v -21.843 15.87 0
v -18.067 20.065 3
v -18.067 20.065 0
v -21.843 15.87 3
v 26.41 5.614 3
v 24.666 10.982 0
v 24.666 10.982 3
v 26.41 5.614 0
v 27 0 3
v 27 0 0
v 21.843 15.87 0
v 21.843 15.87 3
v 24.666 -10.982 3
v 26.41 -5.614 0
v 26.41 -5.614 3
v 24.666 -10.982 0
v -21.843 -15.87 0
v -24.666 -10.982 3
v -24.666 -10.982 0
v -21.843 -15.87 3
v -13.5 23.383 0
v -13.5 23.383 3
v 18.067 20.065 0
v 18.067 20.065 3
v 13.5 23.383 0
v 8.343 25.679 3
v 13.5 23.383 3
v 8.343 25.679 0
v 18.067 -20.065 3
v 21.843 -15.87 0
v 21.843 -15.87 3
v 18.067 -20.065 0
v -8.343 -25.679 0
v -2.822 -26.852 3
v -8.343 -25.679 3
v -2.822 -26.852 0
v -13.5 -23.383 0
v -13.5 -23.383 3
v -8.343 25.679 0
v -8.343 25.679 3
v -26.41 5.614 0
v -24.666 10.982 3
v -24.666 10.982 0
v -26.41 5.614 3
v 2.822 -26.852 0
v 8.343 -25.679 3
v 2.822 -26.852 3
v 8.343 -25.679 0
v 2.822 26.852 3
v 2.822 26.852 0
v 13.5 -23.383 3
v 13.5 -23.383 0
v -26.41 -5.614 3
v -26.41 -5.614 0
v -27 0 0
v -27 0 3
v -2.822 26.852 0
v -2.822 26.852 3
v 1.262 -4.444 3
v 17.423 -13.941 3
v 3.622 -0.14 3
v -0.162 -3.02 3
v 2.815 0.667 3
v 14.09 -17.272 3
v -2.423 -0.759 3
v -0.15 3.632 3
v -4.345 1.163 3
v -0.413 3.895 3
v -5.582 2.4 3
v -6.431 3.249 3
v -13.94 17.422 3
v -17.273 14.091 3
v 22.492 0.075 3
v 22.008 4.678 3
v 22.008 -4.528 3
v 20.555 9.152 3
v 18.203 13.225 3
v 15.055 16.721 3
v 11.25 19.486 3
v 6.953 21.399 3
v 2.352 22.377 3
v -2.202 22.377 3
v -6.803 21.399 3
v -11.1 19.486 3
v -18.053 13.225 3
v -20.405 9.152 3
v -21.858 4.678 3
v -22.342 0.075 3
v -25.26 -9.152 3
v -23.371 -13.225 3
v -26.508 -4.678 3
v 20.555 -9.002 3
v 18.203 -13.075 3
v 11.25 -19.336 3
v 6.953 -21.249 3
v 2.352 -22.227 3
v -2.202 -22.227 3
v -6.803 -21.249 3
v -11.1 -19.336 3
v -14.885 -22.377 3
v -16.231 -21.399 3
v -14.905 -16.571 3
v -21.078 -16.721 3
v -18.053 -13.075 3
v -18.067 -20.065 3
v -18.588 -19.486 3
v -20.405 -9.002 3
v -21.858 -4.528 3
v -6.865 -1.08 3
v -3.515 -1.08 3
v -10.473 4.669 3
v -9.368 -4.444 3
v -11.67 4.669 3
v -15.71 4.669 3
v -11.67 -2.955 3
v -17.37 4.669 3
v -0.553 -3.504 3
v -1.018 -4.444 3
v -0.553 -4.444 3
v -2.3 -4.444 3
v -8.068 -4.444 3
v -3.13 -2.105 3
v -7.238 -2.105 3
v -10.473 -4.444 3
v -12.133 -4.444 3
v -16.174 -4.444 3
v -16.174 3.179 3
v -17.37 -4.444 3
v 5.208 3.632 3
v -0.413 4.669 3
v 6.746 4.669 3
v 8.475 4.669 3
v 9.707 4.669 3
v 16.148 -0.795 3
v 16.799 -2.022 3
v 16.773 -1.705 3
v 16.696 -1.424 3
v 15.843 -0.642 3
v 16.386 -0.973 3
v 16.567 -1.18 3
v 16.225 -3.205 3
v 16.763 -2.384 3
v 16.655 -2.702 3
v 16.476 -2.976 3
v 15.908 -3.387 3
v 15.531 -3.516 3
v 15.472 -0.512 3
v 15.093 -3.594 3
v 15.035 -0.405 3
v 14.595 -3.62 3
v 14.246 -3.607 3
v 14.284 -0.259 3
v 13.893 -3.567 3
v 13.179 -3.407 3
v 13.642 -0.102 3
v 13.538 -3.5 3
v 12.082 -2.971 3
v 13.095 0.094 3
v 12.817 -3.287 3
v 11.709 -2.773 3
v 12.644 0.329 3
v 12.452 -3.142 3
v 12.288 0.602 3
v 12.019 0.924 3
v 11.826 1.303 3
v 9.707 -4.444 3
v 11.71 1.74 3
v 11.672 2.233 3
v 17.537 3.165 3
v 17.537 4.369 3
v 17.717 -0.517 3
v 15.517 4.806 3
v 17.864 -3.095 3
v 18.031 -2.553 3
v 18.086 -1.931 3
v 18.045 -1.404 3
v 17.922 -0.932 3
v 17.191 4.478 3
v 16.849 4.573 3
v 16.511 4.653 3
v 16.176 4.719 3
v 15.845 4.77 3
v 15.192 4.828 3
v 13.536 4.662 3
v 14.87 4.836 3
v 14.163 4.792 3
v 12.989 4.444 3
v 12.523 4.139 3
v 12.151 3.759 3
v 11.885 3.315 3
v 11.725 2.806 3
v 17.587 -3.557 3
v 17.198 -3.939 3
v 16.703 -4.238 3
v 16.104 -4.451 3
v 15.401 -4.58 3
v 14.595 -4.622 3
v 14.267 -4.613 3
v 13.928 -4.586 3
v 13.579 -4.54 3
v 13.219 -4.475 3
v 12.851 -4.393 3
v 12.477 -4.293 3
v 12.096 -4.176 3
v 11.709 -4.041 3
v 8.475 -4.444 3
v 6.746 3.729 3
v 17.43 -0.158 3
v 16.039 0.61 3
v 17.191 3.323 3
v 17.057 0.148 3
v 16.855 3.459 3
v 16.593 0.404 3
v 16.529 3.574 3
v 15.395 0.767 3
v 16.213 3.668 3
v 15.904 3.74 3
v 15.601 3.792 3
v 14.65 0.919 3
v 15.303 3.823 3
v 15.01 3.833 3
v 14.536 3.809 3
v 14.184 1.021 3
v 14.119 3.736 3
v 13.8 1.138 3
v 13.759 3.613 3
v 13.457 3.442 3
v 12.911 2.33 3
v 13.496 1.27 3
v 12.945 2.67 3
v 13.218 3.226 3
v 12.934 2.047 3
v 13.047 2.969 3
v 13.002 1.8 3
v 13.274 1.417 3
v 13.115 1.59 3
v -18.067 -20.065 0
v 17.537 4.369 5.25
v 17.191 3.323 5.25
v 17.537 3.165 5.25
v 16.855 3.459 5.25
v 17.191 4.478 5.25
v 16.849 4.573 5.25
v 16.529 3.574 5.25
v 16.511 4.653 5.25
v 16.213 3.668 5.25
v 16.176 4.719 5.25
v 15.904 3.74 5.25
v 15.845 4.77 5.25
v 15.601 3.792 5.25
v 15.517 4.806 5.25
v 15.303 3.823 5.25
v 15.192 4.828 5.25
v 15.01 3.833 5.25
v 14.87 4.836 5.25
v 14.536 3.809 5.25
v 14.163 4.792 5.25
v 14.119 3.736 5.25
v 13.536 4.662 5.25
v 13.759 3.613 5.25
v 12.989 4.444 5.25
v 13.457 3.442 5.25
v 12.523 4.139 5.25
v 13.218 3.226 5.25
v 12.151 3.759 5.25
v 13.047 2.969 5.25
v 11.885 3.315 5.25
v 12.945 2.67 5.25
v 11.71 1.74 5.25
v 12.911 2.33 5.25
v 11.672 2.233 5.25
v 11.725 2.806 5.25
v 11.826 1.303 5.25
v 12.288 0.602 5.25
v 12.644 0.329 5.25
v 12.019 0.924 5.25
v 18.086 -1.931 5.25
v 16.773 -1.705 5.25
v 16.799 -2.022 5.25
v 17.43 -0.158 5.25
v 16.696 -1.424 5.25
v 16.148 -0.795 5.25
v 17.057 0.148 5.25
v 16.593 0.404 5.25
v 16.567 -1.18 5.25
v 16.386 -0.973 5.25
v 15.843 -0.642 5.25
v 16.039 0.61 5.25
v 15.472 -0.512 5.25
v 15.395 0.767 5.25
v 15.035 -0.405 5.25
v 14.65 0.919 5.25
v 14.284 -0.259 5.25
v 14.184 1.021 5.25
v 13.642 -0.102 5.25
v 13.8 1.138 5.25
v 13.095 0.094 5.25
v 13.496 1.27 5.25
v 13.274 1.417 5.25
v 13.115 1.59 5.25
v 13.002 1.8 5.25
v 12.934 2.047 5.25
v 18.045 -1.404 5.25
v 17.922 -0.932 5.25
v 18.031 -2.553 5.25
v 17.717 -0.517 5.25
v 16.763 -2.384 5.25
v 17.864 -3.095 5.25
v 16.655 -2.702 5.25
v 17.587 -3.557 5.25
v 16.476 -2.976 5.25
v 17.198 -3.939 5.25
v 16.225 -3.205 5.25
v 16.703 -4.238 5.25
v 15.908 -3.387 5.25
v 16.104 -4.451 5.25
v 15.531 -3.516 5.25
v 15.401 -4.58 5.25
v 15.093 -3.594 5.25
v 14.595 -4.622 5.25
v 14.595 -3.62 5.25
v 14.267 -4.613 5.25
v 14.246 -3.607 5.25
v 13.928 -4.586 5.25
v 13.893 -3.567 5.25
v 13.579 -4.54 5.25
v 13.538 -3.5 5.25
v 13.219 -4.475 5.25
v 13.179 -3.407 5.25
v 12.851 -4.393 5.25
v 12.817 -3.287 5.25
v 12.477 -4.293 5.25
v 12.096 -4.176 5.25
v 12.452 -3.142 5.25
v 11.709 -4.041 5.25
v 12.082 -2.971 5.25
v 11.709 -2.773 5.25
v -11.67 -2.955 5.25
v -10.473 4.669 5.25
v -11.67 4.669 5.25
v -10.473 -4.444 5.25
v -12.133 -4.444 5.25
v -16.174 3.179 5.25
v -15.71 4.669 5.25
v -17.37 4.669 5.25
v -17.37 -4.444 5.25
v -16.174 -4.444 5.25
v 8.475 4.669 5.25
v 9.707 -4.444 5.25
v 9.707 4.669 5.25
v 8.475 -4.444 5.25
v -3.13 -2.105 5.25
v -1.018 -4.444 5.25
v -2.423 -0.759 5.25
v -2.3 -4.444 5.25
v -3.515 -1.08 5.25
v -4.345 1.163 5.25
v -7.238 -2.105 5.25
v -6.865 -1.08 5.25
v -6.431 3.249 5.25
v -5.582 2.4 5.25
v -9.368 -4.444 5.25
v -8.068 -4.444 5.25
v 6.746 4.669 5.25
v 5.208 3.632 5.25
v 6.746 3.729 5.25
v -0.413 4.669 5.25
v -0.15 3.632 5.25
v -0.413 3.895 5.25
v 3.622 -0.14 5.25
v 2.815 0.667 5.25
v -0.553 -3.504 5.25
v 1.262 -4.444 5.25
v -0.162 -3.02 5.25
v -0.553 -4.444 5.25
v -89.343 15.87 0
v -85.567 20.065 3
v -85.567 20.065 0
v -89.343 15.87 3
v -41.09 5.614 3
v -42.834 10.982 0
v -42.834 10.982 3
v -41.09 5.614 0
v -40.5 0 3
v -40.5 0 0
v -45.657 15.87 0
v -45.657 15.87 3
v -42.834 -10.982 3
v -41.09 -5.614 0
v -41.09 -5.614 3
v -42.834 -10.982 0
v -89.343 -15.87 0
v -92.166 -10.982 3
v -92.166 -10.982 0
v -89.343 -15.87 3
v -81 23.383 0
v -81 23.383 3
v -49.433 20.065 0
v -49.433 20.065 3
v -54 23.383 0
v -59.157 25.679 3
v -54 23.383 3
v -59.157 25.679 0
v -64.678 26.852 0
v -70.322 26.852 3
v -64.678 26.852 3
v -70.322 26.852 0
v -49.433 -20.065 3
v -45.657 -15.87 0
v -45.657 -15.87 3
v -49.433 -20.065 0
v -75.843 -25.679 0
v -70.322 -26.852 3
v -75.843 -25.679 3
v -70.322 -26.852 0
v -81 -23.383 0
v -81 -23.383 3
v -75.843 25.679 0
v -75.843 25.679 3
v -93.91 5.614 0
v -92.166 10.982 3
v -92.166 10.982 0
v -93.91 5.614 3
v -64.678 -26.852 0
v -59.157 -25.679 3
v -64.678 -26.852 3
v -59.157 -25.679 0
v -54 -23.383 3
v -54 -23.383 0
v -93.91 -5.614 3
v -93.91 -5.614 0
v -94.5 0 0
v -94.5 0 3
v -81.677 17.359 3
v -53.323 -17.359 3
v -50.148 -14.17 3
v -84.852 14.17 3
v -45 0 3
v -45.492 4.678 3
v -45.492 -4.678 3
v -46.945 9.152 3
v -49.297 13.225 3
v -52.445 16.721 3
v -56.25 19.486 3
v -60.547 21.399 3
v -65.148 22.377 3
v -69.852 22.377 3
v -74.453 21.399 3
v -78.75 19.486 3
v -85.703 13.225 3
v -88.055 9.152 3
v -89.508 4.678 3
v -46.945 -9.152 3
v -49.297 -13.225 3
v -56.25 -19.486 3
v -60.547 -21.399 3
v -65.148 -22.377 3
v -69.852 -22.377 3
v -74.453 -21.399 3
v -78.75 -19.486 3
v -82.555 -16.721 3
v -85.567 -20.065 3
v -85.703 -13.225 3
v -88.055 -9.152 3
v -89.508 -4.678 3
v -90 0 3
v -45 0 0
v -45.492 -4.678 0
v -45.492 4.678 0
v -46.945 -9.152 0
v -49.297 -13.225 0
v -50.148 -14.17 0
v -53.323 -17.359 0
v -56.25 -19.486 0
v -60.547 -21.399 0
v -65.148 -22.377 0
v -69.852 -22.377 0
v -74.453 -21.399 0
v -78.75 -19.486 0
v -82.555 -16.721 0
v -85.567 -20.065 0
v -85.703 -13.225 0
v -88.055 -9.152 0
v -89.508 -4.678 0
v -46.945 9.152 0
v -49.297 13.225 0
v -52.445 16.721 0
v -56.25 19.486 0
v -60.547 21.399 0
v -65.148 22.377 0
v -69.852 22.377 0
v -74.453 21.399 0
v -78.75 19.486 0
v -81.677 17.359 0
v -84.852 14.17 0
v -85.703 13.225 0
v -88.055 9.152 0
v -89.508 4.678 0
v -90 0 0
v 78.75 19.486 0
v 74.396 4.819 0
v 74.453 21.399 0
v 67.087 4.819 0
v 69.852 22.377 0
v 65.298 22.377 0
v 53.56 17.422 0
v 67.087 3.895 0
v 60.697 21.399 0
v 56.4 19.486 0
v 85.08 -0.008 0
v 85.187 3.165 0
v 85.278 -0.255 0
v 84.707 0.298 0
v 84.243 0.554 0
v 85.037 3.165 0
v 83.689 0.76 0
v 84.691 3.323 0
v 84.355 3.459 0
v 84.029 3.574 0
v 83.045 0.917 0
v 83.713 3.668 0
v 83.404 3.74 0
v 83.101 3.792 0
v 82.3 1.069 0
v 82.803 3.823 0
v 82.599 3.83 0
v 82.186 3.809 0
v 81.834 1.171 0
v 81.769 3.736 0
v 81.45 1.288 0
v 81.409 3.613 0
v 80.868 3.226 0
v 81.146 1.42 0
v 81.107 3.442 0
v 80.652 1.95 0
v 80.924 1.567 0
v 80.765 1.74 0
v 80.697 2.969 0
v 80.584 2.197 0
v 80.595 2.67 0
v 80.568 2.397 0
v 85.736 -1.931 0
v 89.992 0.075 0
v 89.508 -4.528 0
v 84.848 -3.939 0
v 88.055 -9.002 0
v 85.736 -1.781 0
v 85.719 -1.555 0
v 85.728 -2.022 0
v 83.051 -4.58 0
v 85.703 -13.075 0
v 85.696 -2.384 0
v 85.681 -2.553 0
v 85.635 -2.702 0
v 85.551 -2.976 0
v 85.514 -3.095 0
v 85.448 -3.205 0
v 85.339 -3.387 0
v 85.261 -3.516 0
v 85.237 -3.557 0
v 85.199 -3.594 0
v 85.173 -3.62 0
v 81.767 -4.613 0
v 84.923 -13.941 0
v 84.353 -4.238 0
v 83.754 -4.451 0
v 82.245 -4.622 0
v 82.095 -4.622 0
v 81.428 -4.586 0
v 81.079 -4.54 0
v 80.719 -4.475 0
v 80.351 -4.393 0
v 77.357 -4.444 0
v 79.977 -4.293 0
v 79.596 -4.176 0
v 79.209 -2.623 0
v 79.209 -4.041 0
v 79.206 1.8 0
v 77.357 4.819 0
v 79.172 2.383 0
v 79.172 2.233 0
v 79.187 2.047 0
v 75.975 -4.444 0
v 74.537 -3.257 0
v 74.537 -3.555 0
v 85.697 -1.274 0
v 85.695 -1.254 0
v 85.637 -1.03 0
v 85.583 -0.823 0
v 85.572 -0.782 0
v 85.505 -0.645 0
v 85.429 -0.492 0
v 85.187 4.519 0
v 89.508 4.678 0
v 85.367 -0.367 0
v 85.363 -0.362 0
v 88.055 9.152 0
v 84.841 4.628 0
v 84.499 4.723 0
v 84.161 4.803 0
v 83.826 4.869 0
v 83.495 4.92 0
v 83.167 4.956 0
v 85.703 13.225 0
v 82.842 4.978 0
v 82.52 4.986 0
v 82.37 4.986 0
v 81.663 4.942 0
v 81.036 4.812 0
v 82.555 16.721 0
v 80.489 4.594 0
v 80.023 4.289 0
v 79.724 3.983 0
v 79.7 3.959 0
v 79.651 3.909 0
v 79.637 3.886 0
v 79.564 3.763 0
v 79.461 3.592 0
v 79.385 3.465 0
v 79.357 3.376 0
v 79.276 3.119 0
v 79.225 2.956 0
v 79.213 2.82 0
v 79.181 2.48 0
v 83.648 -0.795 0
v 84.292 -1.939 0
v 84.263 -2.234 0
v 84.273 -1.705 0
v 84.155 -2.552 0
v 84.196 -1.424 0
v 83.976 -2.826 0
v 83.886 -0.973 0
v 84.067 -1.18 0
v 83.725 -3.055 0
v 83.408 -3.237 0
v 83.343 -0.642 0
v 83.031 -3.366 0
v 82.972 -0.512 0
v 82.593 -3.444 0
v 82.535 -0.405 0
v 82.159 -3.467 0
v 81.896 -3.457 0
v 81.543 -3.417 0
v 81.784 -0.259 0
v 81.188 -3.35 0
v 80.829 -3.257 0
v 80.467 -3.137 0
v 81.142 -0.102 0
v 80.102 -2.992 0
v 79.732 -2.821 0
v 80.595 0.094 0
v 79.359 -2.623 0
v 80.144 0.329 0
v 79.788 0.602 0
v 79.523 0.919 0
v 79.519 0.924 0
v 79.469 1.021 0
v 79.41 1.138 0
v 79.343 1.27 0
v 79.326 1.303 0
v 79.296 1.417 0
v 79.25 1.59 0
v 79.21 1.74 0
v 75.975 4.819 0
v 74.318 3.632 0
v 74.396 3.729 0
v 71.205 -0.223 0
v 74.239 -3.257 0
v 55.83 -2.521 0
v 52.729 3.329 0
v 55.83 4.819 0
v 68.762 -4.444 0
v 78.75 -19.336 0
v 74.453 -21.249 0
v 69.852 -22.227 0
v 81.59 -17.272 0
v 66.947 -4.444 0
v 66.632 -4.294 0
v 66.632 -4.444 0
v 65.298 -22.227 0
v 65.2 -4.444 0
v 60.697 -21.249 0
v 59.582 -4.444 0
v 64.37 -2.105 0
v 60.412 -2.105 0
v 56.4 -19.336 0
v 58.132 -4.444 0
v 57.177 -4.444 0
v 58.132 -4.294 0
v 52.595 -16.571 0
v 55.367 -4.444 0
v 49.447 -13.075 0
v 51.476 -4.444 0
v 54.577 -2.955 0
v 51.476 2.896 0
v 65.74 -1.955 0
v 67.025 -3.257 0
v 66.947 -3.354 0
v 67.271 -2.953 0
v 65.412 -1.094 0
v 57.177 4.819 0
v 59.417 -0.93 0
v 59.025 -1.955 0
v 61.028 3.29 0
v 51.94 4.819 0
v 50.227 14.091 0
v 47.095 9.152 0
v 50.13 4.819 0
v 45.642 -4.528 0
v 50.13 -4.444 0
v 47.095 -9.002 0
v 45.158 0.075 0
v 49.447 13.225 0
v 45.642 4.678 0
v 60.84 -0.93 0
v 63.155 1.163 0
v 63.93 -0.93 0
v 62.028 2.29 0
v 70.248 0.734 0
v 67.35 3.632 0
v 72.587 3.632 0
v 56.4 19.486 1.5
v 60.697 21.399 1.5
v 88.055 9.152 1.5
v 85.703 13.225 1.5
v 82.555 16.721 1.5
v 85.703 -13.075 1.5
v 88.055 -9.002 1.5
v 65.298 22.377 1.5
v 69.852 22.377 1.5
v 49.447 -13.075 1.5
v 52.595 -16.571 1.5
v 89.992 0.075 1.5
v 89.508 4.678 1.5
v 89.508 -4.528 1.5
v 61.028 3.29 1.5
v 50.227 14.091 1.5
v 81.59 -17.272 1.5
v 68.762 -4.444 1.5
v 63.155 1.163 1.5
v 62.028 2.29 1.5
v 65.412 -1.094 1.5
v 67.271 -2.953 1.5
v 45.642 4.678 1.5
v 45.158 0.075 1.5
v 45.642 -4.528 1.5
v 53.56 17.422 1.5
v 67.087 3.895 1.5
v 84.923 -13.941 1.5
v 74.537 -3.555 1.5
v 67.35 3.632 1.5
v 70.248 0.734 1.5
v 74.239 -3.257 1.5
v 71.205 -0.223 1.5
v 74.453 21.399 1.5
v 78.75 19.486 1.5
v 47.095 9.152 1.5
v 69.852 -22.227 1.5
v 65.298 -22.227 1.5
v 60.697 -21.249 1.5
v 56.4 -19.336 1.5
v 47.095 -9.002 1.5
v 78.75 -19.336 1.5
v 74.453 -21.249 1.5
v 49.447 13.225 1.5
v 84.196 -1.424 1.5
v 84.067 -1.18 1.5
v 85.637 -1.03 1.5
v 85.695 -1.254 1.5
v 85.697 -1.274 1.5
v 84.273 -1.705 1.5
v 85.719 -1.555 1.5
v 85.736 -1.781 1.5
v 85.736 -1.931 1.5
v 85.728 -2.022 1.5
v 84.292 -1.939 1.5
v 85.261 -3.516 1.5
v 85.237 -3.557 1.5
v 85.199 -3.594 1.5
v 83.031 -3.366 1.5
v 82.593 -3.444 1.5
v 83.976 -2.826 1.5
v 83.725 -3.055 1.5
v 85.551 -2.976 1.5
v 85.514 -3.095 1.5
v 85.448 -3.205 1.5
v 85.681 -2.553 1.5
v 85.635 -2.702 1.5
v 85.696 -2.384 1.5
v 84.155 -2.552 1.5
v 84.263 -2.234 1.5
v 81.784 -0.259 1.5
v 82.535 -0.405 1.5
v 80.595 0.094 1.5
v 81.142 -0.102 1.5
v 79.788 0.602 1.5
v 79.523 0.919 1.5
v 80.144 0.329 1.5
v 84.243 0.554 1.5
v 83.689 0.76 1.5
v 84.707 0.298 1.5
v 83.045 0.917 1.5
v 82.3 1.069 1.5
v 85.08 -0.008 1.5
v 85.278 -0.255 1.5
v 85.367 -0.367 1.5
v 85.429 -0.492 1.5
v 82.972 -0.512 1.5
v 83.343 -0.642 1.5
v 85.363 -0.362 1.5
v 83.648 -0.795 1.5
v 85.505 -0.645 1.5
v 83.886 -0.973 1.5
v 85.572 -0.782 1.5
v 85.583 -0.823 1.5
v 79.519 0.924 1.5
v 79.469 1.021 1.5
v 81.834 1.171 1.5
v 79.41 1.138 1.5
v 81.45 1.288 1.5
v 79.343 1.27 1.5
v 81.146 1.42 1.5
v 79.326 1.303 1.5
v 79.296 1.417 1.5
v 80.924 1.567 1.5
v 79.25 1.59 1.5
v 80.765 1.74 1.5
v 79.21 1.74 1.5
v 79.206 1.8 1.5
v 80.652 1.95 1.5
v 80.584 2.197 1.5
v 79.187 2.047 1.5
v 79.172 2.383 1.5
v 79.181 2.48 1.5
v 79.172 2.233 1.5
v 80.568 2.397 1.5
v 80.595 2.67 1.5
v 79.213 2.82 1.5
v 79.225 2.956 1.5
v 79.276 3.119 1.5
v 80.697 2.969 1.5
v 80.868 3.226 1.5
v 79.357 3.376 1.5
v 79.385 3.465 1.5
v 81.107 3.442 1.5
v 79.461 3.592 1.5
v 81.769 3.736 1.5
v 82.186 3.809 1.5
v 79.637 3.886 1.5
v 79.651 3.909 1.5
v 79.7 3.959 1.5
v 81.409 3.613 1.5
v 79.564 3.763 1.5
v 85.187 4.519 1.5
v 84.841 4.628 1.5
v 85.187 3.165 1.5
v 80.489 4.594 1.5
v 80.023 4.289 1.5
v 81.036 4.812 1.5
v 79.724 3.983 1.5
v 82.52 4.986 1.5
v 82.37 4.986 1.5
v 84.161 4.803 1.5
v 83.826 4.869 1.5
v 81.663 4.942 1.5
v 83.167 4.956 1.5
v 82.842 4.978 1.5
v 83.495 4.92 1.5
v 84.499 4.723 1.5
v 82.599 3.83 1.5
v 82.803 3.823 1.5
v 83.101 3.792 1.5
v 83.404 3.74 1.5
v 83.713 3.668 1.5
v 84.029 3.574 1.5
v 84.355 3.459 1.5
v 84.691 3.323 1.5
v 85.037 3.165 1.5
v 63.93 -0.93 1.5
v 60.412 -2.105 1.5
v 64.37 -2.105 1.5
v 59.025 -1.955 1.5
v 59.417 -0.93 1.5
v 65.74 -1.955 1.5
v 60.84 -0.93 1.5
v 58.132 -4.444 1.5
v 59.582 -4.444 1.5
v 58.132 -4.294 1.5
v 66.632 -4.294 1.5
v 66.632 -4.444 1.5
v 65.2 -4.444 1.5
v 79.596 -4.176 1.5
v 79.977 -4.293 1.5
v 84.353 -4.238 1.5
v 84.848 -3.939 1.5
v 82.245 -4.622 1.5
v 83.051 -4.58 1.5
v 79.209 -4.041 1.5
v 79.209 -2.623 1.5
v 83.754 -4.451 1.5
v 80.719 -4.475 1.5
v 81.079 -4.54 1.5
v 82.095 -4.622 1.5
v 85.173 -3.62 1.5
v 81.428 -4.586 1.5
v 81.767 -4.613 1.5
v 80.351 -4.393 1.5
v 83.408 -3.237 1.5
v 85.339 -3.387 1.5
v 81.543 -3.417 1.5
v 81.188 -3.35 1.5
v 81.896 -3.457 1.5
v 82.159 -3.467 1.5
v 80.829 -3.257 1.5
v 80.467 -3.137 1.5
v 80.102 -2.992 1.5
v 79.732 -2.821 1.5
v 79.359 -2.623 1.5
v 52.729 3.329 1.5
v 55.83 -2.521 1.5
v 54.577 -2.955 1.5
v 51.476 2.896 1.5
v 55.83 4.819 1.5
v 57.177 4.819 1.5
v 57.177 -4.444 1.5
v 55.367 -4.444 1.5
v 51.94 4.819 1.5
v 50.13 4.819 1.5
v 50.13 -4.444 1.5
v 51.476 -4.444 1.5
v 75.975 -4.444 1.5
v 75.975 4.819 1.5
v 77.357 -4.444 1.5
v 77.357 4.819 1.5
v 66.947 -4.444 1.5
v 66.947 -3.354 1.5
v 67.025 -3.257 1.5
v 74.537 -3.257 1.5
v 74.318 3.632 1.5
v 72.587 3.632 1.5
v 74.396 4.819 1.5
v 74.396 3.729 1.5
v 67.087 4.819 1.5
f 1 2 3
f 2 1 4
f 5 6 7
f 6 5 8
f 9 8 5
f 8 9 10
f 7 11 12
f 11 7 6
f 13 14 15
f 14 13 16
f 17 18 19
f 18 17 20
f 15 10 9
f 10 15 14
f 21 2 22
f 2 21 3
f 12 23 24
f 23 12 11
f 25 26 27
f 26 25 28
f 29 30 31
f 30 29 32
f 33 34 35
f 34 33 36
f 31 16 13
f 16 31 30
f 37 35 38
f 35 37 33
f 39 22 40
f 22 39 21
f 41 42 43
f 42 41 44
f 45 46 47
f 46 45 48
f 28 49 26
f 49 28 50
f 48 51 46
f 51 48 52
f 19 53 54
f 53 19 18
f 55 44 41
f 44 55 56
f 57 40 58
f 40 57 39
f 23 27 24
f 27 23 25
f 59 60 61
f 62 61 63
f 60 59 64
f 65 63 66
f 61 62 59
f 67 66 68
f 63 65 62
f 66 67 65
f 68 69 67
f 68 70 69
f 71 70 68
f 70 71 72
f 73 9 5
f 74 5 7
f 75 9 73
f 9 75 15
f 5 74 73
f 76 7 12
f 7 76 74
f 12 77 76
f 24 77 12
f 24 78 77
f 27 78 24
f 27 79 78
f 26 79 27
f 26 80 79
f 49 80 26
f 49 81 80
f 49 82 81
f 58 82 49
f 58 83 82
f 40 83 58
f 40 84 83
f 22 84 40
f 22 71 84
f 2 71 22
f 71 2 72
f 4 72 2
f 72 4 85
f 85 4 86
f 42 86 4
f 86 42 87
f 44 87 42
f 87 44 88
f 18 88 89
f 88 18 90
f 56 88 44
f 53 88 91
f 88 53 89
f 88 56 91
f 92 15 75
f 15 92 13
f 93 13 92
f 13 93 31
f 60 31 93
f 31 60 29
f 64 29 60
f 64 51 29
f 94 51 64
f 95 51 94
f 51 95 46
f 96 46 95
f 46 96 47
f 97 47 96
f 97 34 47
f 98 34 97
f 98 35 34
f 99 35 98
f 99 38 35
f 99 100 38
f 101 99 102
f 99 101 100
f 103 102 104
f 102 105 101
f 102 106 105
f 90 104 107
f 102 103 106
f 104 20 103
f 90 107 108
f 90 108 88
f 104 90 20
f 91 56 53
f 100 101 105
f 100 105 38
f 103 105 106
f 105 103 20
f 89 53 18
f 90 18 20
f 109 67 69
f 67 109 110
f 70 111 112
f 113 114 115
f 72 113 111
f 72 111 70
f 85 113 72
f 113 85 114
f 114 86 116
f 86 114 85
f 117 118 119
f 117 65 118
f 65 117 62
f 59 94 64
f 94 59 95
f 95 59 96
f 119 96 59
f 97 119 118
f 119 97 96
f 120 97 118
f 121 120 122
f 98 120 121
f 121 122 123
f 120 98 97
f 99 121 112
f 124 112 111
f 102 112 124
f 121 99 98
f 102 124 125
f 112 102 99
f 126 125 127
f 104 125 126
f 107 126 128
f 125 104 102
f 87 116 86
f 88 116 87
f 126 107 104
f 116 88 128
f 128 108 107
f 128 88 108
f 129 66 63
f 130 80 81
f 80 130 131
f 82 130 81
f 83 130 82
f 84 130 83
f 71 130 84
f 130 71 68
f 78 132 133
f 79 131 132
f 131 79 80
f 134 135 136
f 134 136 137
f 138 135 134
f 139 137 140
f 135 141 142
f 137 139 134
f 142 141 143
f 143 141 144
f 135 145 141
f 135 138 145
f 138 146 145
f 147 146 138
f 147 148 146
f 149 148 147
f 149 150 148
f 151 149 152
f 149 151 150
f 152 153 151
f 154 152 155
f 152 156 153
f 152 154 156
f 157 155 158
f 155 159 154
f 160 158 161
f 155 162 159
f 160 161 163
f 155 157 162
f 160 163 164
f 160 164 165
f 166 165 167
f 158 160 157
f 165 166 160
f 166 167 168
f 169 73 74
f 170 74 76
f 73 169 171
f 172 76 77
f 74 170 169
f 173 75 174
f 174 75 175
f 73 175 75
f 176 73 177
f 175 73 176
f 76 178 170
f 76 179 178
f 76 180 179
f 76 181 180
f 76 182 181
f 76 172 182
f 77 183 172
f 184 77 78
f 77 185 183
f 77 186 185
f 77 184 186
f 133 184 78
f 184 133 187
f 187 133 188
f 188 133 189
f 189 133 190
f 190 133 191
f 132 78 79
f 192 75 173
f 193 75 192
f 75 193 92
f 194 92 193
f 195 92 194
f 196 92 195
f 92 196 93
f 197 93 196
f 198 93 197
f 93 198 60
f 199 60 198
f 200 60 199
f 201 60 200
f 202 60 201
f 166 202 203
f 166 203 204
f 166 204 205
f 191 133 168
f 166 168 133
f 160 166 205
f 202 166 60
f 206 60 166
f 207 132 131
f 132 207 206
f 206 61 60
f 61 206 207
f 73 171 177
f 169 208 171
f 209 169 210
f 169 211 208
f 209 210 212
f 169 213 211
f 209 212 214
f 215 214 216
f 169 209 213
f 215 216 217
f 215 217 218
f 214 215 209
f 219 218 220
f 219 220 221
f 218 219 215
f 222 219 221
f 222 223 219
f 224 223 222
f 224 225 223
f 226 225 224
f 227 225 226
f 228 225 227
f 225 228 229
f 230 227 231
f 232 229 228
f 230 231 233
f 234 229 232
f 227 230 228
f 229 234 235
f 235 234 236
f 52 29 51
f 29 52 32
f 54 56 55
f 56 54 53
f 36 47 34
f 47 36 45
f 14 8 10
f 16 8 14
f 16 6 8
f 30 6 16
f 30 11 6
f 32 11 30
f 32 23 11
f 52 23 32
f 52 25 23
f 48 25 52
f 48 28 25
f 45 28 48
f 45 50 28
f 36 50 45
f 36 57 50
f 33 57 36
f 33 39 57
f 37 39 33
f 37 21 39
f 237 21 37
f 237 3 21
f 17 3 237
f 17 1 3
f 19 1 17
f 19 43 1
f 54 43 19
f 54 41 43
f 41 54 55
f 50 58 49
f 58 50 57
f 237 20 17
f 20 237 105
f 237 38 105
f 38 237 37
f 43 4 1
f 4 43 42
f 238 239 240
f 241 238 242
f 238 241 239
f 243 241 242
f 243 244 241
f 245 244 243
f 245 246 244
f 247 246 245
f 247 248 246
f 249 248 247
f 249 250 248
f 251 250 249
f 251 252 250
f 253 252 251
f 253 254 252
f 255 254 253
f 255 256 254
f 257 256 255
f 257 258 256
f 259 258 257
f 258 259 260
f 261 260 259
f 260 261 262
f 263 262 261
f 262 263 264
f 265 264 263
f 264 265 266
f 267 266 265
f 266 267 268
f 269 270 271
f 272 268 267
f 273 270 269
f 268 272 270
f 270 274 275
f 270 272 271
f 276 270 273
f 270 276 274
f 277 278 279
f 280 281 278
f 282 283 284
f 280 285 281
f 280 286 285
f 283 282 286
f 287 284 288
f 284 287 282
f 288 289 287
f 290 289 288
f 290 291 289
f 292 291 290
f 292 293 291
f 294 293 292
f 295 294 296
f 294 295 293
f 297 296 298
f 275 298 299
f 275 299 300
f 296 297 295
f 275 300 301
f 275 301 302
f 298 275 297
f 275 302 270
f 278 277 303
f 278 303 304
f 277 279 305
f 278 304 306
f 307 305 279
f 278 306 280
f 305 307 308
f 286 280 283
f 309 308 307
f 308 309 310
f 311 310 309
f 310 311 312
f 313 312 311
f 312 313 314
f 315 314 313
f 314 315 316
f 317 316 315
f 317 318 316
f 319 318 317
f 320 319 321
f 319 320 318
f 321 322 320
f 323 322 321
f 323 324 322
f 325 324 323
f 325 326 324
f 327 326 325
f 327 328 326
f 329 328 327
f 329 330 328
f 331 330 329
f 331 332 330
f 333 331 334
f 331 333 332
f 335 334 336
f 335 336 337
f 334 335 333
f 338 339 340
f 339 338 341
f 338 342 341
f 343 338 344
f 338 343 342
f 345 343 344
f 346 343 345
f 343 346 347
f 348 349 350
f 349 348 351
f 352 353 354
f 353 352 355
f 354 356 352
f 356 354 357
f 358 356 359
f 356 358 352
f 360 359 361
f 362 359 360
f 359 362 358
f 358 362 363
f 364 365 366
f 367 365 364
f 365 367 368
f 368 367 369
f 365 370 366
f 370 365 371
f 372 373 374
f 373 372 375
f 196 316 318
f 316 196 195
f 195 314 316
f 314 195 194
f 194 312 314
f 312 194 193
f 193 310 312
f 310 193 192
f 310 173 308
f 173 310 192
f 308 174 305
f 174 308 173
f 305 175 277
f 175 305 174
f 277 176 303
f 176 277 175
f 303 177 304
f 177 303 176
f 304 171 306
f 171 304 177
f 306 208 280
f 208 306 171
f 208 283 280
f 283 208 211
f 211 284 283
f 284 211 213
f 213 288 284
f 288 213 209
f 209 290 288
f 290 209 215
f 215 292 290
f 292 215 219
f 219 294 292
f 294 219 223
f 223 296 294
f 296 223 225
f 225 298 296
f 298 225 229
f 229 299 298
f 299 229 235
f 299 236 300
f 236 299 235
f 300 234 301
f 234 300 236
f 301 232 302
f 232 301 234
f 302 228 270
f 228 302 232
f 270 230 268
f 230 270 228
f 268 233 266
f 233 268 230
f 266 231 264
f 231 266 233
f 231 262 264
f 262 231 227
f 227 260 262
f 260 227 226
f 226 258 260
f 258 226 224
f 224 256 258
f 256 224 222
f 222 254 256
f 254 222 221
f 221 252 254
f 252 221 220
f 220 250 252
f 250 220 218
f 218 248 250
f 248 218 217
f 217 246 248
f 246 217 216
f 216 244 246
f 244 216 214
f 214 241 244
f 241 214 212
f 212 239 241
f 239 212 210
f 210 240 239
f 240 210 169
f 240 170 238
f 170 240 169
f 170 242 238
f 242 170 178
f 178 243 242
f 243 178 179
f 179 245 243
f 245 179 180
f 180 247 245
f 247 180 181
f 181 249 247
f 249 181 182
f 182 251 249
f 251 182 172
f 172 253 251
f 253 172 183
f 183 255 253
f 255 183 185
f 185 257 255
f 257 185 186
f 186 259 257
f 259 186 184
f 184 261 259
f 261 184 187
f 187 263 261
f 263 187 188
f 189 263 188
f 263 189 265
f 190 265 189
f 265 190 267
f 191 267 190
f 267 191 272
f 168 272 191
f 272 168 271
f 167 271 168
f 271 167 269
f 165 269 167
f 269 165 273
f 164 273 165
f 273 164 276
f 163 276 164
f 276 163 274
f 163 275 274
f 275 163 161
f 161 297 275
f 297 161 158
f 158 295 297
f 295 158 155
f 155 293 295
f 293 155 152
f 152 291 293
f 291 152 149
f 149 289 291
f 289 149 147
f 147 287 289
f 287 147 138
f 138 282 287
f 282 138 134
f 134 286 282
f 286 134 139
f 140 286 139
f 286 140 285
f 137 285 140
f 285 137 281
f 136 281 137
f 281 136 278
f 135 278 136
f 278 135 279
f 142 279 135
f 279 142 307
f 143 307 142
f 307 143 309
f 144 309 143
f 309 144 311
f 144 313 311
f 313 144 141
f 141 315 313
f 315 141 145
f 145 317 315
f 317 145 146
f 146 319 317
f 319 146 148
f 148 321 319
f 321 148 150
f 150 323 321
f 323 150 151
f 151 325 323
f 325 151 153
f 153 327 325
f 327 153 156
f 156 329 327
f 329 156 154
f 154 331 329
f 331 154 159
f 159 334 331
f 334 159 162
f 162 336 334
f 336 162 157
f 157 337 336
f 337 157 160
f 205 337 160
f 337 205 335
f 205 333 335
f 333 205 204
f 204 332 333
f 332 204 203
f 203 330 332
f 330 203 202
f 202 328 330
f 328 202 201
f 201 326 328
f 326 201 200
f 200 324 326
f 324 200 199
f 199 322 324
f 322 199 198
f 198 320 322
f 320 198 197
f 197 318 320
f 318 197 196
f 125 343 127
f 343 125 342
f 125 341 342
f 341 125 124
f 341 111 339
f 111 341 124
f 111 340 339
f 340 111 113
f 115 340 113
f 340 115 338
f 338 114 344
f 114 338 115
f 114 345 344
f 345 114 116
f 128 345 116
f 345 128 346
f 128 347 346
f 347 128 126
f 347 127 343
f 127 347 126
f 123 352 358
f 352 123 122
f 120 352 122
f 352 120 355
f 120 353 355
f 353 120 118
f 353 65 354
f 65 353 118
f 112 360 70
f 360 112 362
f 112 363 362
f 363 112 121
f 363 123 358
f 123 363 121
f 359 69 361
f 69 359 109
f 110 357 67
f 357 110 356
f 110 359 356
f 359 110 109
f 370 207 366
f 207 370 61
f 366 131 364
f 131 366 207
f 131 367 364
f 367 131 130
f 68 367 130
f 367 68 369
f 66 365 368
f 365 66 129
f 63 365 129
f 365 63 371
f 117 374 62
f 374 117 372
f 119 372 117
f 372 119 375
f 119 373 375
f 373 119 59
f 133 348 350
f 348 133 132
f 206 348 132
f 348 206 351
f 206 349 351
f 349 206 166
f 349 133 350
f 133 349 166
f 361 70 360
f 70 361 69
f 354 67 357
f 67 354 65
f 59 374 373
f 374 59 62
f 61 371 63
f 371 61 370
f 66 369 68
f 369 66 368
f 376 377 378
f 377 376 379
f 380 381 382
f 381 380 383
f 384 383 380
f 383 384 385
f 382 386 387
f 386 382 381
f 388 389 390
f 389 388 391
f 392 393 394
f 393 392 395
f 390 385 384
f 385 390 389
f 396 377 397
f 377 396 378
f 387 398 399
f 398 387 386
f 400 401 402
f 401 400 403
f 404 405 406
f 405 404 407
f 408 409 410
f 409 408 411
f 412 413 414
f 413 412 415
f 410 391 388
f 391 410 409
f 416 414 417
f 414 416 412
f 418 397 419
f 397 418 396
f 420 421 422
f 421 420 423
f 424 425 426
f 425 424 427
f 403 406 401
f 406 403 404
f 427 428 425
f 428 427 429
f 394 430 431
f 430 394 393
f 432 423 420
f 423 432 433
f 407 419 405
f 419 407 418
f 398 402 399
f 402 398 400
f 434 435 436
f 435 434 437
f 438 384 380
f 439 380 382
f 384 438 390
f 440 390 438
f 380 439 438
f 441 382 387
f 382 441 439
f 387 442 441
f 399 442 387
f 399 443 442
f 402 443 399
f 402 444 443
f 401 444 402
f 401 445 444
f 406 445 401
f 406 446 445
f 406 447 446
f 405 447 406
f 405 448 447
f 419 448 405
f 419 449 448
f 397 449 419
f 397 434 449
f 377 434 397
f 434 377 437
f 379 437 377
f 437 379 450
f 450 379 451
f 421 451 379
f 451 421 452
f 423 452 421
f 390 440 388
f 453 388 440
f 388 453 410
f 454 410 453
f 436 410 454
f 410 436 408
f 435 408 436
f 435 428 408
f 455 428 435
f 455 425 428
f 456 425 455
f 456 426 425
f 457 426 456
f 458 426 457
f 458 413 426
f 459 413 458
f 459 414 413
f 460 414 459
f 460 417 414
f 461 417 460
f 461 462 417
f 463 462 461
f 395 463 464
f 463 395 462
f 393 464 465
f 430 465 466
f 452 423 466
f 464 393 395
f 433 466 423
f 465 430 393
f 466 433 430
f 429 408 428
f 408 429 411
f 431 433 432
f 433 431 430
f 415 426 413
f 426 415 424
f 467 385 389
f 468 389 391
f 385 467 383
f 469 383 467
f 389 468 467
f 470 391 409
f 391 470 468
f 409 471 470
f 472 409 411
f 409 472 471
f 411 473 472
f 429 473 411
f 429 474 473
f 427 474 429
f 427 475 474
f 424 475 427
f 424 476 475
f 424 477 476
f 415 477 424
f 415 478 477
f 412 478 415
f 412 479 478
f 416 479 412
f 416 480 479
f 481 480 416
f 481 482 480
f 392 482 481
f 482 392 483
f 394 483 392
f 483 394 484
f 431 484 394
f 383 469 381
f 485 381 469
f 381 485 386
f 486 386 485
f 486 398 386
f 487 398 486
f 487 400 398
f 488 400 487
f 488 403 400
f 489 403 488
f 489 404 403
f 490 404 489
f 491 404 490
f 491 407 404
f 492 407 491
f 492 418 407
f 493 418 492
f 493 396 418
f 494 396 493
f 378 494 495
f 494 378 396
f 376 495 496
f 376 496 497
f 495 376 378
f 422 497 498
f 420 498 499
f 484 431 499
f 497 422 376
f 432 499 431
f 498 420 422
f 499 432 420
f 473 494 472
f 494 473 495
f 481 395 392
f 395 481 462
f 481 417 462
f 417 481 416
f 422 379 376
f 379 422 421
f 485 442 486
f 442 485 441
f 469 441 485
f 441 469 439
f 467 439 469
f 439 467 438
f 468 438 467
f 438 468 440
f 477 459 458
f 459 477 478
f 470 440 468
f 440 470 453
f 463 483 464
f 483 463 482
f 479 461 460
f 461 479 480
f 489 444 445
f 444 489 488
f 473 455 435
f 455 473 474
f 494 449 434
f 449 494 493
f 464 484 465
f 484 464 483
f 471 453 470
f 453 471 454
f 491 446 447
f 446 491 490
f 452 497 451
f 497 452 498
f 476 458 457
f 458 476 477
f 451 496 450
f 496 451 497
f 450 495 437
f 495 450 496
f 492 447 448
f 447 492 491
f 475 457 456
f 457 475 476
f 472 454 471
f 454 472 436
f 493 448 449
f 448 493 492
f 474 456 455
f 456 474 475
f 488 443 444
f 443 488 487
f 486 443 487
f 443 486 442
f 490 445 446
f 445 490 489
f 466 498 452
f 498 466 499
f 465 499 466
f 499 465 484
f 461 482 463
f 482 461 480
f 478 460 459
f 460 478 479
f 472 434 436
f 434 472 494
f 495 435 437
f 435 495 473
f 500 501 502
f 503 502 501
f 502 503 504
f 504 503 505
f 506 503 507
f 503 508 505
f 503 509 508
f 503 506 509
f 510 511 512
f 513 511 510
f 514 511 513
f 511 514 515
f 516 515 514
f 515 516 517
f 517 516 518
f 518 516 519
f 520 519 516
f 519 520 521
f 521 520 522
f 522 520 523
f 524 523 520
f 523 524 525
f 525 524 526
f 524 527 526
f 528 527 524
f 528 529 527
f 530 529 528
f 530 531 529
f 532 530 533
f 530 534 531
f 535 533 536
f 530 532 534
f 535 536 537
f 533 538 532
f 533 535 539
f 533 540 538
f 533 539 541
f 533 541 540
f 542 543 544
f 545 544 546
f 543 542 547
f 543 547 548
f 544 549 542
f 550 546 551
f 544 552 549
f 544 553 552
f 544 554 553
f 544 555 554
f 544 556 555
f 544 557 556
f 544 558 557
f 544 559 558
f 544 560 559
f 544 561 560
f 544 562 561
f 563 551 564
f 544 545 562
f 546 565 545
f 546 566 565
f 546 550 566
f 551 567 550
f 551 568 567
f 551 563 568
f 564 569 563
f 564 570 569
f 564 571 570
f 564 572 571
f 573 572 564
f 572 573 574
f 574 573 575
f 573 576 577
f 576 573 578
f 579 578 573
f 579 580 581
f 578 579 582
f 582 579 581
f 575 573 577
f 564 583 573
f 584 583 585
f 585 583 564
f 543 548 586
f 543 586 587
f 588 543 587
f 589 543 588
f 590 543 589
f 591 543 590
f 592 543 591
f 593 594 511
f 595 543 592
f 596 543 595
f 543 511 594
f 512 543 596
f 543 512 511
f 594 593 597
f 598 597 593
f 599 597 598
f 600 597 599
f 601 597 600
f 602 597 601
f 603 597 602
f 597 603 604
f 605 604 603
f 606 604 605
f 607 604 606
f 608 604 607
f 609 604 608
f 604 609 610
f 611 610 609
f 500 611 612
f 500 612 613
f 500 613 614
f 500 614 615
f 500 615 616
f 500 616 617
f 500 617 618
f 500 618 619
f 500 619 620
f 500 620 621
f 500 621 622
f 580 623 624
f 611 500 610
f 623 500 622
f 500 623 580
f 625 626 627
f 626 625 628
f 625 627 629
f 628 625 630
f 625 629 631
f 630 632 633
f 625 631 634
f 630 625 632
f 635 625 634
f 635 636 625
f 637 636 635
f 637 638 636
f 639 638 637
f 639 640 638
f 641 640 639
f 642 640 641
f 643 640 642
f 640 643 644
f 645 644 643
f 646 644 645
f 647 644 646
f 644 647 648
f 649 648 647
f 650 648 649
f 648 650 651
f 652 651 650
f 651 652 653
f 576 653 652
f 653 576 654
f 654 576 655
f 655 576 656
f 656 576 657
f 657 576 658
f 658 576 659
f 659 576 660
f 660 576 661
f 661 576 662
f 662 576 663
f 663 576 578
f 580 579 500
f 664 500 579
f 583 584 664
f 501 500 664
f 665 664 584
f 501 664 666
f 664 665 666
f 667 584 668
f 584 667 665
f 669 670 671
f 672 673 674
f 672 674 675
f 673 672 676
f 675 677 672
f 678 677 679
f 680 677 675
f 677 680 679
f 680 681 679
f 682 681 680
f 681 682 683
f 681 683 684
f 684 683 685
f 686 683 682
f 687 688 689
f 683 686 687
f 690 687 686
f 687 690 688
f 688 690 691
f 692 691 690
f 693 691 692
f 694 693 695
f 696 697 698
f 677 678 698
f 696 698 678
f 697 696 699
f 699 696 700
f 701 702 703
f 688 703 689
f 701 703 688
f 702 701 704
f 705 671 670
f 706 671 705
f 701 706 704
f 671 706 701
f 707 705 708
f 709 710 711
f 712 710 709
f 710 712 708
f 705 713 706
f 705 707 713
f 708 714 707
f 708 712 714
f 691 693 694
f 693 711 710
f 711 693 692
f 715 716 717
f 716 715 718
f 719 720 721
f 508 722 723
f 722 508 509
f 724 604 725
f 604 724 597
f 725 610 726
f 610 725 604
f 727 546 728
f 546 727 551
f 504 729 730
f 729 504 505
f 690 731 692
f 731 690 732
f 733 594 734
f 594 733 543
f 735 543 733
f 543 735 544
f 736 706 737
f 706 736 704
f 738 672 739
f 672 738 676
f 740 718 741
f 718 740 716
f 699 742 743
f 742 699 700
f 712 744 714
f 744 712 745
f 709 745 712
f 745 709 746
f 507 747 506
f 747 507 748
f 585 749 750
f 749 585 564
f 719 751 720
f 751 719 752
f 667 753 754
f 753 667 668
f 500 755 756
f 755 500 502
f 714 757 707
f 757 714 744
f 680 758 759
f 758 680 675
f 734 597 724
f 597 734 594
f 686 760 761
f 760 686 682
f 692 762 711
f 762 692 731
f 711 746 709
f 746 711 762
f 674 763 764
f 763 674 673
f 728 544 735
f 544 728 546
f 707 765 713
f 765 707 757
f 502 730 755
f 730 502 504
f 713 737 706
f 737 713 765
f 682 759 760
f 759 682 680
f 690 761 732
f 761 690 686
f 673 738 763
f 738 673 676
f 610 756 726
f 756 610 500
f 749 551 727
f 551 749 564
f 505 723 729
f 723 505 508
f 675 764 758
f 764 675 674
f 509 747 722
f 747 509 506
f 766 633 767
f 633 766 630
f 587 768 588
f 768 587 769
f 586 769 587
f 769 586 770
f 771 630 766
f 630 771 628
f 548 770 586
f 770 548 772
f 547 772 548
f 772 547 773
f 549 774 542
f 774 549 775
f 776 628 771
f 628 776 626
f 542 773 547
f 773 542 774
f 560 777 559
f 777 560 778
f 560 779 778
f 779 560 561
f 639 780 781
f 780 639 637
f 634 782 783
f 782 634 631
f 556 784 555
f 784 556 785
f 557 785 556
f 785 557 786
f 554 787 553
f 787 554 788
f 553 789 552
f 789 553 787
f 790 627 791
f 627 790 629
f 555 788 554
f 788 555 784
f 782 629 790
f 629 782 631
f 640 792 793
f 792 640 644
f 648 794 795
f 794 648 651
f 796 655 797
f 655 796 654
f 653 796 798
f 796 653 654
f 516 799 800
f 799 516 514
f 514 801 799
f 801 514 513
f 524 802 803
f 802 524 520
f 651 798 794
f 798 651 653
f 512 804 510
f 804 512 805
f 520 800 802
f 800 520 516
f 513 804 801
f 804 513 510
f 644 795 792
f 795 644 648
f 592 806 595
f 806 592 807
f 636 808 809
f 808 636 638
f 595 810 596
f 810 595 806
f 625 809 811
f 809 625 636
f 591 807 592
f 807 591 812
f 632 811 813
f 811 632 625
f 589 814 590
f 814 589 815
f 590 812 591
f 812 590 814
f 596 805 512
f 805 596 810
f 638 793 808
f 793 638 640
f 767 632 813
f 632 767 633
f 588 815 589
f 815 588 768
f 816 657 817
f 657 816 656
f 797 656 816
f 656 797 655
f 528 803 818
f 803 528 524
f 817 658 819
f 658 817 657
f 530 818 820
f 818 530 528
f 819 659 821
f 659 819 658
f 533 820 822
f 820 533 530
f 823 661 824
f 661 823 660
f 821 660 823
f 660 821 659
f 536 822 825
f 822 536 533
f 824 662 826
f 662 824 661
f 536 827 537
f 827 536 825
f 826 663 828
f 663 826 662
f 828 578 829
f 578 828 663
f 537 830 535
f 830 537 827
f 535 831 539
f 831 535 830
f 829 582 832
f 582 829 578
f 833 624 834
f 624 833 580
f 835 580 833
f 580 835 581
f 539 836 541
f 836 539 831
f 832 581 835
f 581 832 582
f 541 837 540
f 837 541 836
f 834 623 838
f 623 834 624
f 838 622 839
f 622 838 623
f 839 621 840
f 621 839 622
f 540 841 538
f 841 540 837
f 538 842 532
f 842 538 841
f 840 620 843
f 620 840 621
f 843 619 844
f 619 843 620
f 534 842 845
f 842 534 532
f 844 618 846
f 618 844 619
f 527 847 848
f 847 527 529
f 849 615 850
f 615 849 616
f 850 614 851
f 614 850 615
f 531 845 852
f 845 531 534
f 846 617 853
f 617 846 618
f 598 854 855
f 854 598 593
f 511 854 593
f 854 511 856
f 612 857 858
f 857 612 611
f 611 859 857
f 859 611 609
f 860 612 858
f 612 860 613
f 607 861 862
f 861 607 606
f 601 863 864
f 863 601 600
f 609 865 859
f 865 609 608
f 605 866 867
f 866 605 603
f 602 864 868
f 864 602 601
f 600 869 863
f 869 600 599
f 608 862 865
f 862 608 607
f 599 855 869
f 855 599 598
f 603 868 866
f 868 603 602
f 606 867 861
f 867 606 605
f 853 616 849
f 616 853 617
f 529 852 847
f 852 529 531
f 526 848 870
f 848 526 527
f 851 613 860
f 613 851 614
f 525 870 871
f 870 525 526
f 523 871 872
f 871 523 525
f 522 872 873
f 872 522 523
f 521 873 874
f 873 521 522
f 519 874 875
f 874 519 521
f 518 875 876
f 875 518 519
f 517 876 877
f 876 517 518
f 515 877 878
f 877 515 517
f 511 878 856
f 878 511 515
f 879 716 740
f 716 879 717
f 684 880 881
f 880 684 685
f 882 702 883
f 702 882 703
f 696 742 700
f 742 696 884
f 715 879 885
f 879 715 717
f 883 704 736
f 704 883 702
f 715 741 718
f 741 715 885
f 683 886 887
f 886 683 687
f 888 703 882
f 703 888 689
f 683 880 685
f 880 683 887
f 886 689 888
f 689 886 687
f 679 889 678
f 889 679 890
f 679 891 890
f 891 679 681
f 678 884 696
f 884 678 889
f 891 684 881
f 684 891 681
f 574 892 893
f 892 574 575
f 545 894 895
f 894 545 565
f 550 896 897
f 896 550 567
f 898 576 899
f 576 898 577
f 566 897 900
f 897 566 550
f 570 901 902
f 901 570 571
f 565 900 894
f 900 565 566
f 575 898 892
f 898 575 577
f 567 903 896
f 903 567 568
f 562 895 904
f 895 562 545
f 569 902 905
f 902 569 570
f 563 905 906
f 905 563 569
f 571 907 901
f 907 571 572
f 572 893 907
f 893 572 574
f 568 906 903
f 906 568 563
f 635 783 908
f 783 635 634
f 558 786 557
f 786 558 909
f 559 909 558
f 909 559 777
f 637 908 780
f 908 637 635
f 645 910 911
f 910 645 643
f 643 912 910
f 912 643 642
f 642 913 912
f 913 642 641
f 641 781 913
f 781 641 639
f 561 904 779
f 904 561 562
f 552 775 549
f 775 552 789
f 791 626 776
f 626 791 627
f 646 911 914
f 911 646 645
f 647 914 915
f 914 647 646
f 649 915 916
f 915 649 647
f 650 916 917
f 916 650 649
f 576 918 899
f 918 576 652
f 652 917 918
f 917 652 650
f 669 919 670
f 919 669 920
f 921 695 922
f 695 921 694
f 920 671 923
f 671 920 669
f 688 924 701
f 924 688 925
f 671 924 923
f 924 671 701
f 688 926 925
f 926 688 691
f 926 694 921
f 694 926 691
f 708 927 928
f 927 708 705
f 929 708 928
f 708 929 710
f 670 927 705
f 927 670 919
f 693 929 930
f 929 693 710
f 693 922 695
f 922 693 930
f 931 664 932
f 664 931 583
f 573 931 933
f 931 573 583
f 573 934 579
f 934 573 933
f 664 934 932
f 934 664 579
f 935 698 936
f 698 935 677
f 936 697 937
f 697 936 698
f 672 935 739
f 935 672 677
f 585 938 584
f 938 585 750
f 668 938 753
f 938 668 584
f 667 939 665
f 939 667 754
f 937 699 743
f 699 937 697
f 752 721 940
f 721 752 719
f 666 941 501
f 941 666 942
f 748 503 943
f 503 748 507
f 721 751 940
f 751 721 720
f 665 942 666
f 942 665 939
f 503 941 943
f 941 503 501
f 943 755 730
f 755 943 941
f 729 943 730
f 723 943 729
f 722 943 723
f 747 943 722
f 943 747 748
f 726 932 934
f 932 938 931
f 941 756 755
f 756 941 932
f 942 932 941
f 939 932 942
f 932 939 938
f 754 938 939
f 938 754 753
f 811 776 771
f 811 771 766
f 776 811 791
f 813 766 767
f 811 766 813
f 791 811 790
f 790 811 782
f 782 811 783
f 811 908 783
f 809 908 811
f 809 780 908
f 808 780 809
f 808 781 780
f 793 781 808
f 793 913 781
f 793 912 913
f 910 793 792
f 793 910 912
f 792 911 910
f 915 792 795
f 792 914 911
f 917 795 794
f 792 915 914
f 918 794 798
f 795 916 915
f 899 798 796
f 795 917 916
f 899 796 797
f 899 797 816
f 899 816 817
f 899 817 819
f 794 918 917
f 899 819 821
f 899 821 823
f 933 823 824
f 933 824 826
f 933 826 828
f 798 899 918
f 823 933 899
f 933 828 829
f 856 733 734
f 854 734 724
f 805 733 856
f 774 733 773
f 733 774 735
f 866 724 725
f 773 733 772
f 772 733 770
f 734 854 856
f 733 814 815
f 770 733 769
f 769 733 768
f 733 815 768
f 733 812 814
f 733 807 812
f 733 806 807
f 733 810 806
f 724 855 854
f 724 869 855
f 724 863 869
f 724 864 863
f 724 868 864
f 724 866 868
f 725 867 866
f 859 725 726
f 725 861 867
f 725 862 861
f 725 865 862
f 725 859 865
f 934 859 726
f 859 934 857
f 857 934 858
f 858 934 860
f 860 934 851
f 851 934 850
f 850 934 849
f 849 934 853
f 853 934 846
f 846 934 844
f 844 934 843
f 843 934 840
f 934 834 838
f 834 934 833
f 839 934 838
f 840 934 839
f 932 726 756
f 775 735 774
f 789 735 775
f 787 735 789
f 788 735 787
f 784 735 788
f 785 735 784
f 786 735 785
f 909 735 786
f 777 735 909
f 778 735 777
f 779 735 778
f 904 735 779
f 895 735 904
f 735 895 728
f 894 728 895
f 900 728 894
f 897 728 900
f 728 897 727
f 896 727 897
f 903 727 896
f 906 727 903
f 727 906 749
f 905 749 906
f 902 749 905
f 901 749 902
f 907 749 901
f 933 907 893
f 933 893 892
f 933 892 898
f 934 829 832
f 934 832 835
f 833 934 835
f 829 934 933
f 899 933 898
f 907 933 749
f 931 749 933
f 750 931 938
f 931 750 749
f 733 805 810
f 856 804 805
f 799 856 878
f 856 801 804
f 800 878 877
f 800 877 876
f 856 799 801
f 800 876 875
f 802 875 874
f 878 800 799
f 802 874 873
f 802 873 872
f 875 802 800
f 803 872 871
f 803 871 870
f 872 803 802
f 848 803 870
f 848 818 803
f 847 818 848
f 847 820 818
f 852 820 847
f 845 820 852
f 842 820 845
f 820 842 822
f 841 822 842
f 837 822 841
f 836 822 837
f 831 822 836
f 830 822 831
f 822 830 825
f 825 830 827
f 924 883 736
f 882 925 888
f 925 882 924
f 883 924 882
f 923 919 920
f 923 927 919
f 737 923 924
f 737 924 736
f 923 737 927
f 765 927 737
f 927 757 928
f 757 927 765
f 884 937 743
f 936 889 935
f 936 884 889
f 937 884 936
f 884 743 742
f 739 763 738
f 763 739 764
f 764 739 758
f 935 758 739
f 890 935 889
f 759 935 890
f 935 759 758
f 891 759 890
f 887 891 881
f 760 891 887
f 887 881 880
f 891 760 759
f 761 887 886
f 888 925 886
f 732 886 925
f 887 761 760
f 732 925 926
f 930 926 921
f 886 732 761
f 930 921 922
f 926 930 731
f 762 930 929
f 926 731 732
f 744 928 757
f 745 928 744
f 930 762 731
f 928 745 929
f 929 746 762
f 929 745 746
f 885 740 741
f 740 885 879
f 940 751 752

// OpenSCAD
union() {
	translate(v = [0, 0, 3.0]) {
		difference() {
			union() {
				translate(v = [0, 0, -3.0]) {
					cylinder(h = 3.0, r = 27.0);
				}
				linear_extrude(height = 2.25) {
					text(font = "Mic 32Bold", halign = "center", size = 9, text = "NAZIS", valign = "center");
				}
			}
			minkowski() {
				union() {
					difference() {
						cylinder(h = 3.0, r = 27.0);
						cylinder(h = 3.0, r = 22.5);
					}
					rotate(a = [0, 0, -45]) {
						translate(v = [-24.75, 0, 0]) {
							translate(v = [0, -2.25, 0]) {
								cube(size = [49.5, 4.5, 3.0]);
							}
						}
					}
				}
				cube(size = [0.15, 0.15, 0.15]);
			}
		}
	}
	translate(v = [-67.5, 0, 0]) {
		union() {
			difference() {
				cylinder(h = 3.0, r = 27.0);
				cylinder(h = 3.0, r = 22.5);
			}
			rotate(a = [0, 0, -45]) {
				translate(v = [-24.75, 0, 0]) {
					translate(v = [0, -2.25, 0]) {
						cube(size = [49.5, 4.5, 3.0]);
					}
				}
			}
		}
	}
	translate(v = [67.5, 0, 0]) {
		difference() {
			cylinder(h = 1.5, r = 22.5);
			minkowski() {
				linear_extrude(height = 2.25) {
					text(font = "Mic 32Bold", halign = "center", size = 9, text = "NAZIS", valign = "center");
				}
				cube(size = [0.15, 0.15, 0.15]);
			}
			minkowski() {
				union() {
					difference() {
						cylinder(h = 3.0, r = 27.0);
						cylinder(h = 3.0, r = 22.5);
					}
					rotate(a = [0, 0, -45]) {
						translate(v = [-24.75, 0, 0]) {
							translate(v = [0, -2.25, 0]) {
								cube(size = [49.5, 4.5, 3.0]);
							}
						}
					}
				}
				cube(size = [0.15, 0.15, 0.15]);
			}
		}
	}
}
